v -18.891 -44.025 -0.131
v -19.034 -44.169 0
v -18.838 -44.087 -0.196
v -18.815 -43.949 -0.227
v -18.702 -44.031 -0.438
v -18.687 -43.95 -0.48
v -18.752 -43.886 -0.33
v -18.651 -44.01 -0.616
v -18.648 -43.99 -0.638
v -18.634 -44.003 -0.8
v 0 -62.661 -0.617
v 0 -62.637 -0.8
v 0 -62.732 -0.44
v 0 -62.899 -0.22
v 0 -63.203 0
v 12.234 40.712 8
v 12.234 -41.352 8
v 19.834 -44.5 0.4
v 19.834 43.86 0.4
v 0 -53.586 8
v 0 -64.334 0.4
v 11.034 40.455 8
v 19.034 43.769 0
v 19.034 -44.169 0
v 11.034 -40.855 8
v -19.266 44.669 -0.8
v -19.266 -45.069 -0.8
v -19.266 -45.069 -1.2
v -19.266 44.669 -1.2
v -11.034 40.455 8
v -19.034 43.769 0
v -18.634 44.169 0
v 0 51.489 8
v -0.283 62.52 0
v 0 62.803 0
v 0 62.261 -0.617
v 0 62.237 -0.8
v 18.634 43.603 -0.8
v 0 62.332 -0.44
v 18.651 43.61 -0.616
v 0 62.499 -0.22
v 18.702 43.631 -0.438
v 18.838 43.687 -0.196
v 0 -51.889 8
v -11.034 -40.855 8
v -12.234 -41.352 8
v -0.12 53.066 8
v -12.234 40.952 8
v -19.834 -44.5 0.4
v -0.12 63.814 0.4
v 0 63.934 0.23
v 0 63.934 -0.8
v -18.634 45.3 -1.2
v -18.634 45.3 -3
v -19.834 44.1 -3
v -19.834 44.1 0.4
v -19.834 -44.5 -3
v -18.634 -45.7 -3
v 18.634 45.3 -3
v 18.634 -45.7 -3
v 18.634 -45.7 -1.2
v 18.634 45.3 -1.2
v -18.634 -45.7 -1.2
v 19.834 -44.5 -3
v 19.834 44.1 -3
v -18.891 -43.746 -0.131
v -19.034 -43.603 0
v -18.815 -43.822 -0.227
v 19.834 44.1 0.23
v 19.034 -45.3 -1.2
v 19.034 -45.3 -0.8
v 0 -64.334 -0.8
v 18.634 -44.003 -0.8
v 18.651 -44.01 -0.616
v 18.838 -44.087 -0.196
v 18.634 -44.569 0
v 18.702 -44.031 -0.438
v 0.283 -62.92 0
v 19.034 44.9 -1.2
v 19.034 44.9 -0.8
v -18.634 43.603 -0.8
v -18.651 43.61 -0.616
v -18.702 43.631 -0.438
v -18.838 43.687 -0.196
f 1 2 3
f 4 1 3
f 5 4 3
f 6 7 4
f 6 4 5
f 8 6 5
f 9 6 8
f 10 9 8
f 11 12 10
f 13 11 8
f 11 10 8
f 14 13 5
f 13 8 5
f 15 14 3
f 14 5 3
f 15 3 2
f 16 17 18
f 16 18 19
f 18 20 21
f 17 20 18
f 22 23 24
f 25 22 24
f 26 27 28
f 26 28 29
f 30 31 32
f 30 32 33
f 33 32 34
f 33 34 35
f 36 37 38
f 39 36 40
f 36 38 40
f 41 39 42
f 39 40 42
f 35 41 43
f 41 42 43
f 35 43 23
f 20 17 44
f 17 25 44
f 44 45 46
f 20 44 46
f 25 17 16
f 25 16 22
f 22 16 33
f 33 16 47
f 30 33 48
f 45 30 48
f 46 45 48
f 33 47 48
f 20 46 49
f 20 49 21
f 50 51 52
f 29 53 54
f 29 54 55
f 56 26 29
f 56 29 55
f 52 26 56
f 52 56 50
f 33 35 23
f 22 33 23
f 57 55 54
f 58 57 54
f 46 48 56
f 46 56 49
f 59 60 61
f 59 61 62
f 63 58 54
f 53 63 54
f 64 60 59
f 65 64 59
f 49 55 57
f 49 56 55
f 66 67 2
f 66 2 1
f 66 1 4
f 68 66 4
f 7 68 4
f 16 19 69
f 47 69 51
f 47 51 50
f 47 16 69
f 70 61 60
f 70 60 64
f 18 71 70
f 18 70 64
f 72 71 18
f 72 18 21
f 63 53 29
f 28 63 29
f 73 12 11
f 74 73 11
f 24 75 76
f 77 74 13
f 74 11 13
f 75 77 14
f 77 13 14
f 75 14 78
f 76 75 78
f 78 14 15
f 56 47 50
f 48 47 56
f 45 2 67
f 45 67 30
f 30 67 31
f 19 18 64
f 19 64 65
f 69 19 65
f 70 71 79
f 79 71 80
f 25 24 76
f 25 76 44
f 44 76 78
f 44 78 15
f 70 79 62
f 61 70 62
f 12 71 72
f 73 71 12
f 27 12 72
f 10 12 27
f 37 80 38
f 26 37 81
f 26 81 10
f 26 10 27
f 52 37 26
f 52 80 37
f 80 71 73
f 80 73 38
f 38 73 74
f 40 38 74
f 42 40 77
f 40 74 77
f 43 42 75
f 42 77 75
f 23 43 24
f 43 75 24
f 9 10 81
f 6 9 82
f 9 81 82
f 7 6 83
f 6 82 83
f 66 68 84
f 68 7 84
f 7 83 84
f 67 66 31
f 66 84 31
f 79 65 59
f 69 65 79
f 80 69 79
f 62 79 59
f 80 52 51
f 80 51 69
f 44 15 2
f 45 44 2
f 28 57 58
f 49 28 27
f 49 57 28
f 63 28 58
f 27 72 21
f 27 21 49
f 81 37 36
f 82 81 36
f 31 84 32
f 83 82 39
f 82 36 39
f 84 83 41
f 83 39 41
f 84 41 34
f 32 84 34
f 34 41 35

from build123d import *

# Parameters (mm, degrees)
EXTRUDE_2_DEPTH          = 8
CUT_EXTRUDE_1_DEPTH      = 8
CUT_EXTRUDE_1_DRAFT      = -45
SKETCH_3_OUTSIDE_W       = 84.568
SKETCH_3_OUTSIDE_H       = 173.168
CUT_EXTRUDE_5_DEPTH      = 8
CUT_EXTRUDE_5_DRAFT      = -45
EXTRUDE_1_DEPTH          = 3
FILLET_1_R               = 1
FILLET_2_R               = 1
CUT_EXTRUDE_6_DEPTH      = 37.9
CUT_EXTRUDE_6_DEPTH_BACK = 0.4
SKETCH_5_W               = 0.4
SKETCH_5_H               = 87.60588745
SKETCH_7_W               = 38.3
SKETCH_7_H               = 22.901916238
CUT_EXTRUDE_8_DEPTH      = 0.4
SKETCH_8_W               = 38.3
SKETCH_8_H               = 25.571304525
CUT_EXTRUDE_9_DEPTH      = 0.4
SKETCH_9_W               = 37.268690424
SKETCH_9_H               = 136.16118074
CUT_EXTRUDE_10_DEPTH     = 1.8


with BuildPart() as part:
    # Skizze1 → Бобышка-Вытянуть2 (new body)
    with BuildSketch(Plane.XY):
        Polygon((-19.834345212, 44.1), (0, 63.934345212), (19.834345212, 44.1), (19.834345212, -44.5), (0, -64.334345212), (-19.834345212, -44.5), align=None)
    extrude(amount=EXTRUDE_2_DEPTH)


with BuildPart() as cut_extrude_1_tool:
    # Эскиз1 → Вырез-Вытянуть1 (with draft: the straight prism first)
    with BuildSketch(Plane(origin=(0, 0, 0), x_dir=(-1, 0, 0), z_dir=(0, 0, -1))):
        Polygon((0, 62.802974362), (-19.034345212, 43.76862915), (-19.034345212, -44.16862915), (0, -63.202974362), (19.034345212, -44.16862915), (19.034345212, 43.76862915), align=None)
    extrude(amount=-CUT_EXTRUDE_1_DEPTH)
    # Вырез-Вытянуть1: the draft: its side faces are tilted about the plane it starts from
    cut_extrude_1_sides = [cut_extrude_1_tool.faces().sort_by_distance(p)[0] for p in [
        (9.517172606, 53.285801756, 4),
        (19.034345212, -0.2, 4),
        (9.517172606, -53.685801756, 4),
        (-9.517172606, -53.685801756, 4),
        (-19.034345212, -0.2, 4),
        (-9.517172606, 53.285801756, 4),
    ]]
    draft(cut_extrude_1_sides, Plane(origin=(0, 0, 0), x_dir=(-1, 0, 0), z_dir=(0, 0, -1)), CUT_EXTRUDE_1_DRAFT)


with BuildPart() as part_1:
    add(part.part)

    # Вырез-Вытянуть1: cut by cut_extrude_1_tool
    add(cut_extrude_1_tool.part, mode=Mode.SUBTRACT)


with BuildPart() as cut_extrude_5_tool:
    # Эскиз3 outside → Вырез-Вытянуть5 (with draft: the straight prism first)
    with BuildSketch(Plane.XY.offset(8)):
        with Locations((0, -0.2)):
            Rectangle(SKETCH_3_OUTSIDE_W, SKETCH_3_OUTSIDE_H)
        Polygon((-12.234345212, 40.951976926), (-12.234345212, -41.351976926), (0, -53.586322138), (12.234345212, -41.351976926), (12.234345212, 40.711808204), (-0.120084361, 53.066237777), align=None, mode=Mode.SUBTRACT)
    extrude(amount=-CUT_EXTRUDE_5_DEPTH)
    # Вырез-Вытянуть5: the draft: its side faces are tilted about the plane it starts from
    cut_extrude_5_sides = [cut_extrude_5_tool.faces().sort_by_distance(p)[0] for p in [
        (0, -86.784, 4),
        (42.284, -0.2, 4),
        (0, 86.384, 4),
        (-42.284, -0.2, 4),
        (-6.177214787, 47.009107352, 4),
        (6.057130426, 46.889022991, 4),
        (12.234345212, -0.320084361, 4),
        (6.117172606, -47.469149532, 4),
        (-6.117172606, -47.469149532, 4),
        (-12.234345212, -0.2, 4),
    ]]
    draft(cut_extrude_5_sides, Plane.XY.offset(8), CUT_EXTRUDE_5_DRAFT)


with BuildPart() as part_2:
    add(part_1.part)

    # Вырез-Вытянуть5: cut by cut_extrude_5_tool
    add(cut_extrude_5_tool.part, mode=Mode.SUBTRACT)

    # Эскиз4 → Вытянуть-Тонкостенный1 (add)
    with BuildSketch(Plane(origin=(0, 0, 0), x_dir=(-1, 0, 0), z_dir=(0, 0, -1))):
        Polygon((19.834345212, 44.1), (19.834345212, -44.5), (0, -64.334345212), (-19.834345212, -44.5), (-19.834345212, 44.1), (0, 63.934345212), align=None)
        Polygon((18.634345212, 43.602943725), (18.634345212, -44.002943725), (0, -62.637288937), (-18.634345212, -44.002943725), (-18.634345212, 43.602943725), (0, 62.237288937), align=None, mode=Mode.SUBTRACT)
    extrude(amount=EXTRUDE_1_DEPTH)

    # Скругление1
    # the kernel refuses this fillet: 1 mm, written as the material it takes off along each edge
    with BuildSketch(Plane(origin=(-18.634345212, 45.602943725, 0), x_dir=(-1, 0, 0), z_dir=(0, -1, 0))) as fillet_1_piece_1_section:
        with BuildLine():
            CenterArc((1, 0.8), FILLET_1_R, 180, 53.130102354)
            Line((0, 0.8), (-0.02, 0.8))
            Line((-0.02, 0.8), (-0.02, 0))
            Line((-0.02, 0), (0, -0.02))
            ThreePointArc((0, -0.02), (0.2, -0.02), (0.388, -0.016))
            Line((0.388, -0.016), (0.4, 0))
        make_face()
    fillet_1_piece_1 = extrude(amount=91.60588745, mode=Mode.PRIVATE)
    fillet_1_piece_1 = split(fillet_1_piece_1, bisect_by=Plane(origin=(-18.834345212, 45.602943725, 0.2), z_dir=(0.7071067811865462, 0, -0.7071067811865488)), keep=Keep.TOP, mode=Mode.PRIVATE)
    fillet_1_piece_1 = split(fillet_1_piece_1, bisect_by=Plane(origin=(-63.437288937, 0.8, 0), z_dir=(0.7071067811865476, 0.7071067811865476, 0)), keep=Keep.TOP, mode=Mode.PRIVATE)
    fillet_1_piece_1 = split(fillet_1_piece_1, bisect_by=Plane(origin=(-17.634345212, 44.602943725, 0), z_dir=(0.7071067811865469, -0.7071067811865481, 0)), keep=Keep.TOP, mode=Mode.PRIVATE)
    add(fillet_1_piece_1, mode=Mode.SUBTRACT)
    with BuildSketch(Plane(origin=(0, 62.237288937, 0), x_dir=(-0.7071067811865469, 0.7071067811865482, 0), z_dir=(-0.7071067811865481, -0.7071067811865469, 0))) as fillet_1_piece_2_section:
        with BuildLine():
            CenterArc((1, 0.8), FILLET_1_R, 180, 53.130102354)
            Line((0, 0.8), (-0.02, 0.8))
            Line((-0.02, 0.8), (-0.02, 0))
            Line((-0.02, 0), (0, -0.02))
            ThreePointArc((0, -0.02), (0.2, -0.02), (0.388, -0.016))
            Line((0.388, -0.016), (0.4, 0))
        make_face()
    fillet_1_piece_2 = extrude(amount=28.352943725, mode=Mode.PRIVATE)
    fillet_1_piece_2 = split(fillet_1_piece_2, bisect_by=Plane(origin=(-0.141421356, 62.378710294, 0.2), z_dir=(0.499999999999999, -0.4999999999999993, -0.7071067811865488)), keep=Keep.TOP, mode=Mode.PRIVATE)
    fillet_1_piece_2 = split(fillet_1_piece_2, bisect_by=Plane(origin=(-18.634345212, 62.237288937, 0), z_dir=(1, 0, 0)), keep=Keep.TOP, mode=Mode.PRIVATE)
    add(fillet_1_piece_2, mode=Mode.SUBTRACT)
    with BuildSketch(Plane(origin=(0, 62.237288937, 0), x_dir=(-0.7071067811865469, 0.7071067811865482, 0), z_dir=(-0.7071067811865481, -0.7071067811865469, 0))) as fillet_1_piece_3a_section:
        with BuildLine():
            CenterArc((1, 0.8), FILLET_1_R, 180, 53.130102354)
            Line((0, 0.8), (-0.02, 0.8))
            Line((-0.02, 0.8), (-0.02, 0))
            Line((-0.02, 0), (0, -0.02))
            ThreePointArc((0, -0.02), (0.2, -0.02), (0.388, -0.016))
            Line((0.388, -0.016), (0.4, 0))
        make_face()
    fillet_1_piece_3a = extrude(amount=28.352943725, mode=Mode.PRIVATE)
    fillet_1_piece_3a = split(fillet_1_piece_3a, bisect_by=Plane(origin=(-9.517172606, 62.237288937, 9.517172606), z_dir=(0.7071067811865462, 0, -0.7071067811865488)), keep=Keep.TOP, mode=Mode.PRIVATE)
    fillet_1_piece_3a = split(fillet_1_piece_3a, bisect_by=Plane(origin=(-0.141421356, 62.378710294, 0.2), z_dir=(0.499999999999999, -0.4999999999999993, -0.7071067811865488)), keep=Keep.TOP, mode=Mode.PRIVATE)
    fillet_1_piece_3a = split(fillet_1_piece_3a, bisect_by=Plane(origin=(-18.634345212, 62.237288937, 0), z_dir=(-1, 0, 0)), keep=Keep.TOP, mode=Mode.PRIVATE)
    with BuildSketch(Plane(origin=(-18.634345212, 45.602943725, 0), x_dir=(-1, 0, 0), z_dir=(0, -1, 0))) as fillet_1_piece_3b_section:
        with BuildLine():
            CenterArc((1, 0.8), FILLET_1_R, 180, 53.130102354)
            Line((0, 0.8), (-0.02, 0.8))
            Line((-0.02, 0.8), (-0.02, 0))
            Line((-0.02, 0), (0, -0.02))
            ThreePointArc((0, -0.02), (0.2, -0.02), (0.388, -0.016))
            Line((0.388, -0.016), (0.4, 0))
        make_face()
    fillet_1_piece_3b = extrude(amount=91.60588745, mode=Mode.PRIVATE)
    fillet_1_piece_3b = split(fillet_1_piece_3b, bisect_by=Plane(origin=(-18.834345212, 45.602943725, 0.2), z_dir=(0.7071067811865462, 0, -0.7071067811865488)), keep=Keep.TOP, mode=Mode.PRIVATE)
    fillet_1_piece_3b = split(fillet_1_piece_3b, bisect_by=Plane(origin=(-18.275766569, 45.244365081, -0.507106781), z_dir=(0.499999999999999, -0.4999999999999993, -0.7071067811865488)), keep=Keep.TOP, mode=Mode.PRIVATE)
    fillet_1_piece_3b = split(fillet_1_piece_3b, bisect_by=Plane(origin=(-17.634345212, 44.602943725, 0), z_dir=(-0.7071067811865469, 0.7071067811865481, 0)), keep=Keep.TOP, mode=Mode.PRIVATE)
    fillet_1_piece_3 = fillet_1_piece_3a & fillet_1_piece_3b
    add(fillet_1_piece_3, mode=Mode.SUBTRACT)

    # Скругление2
    # the kernel refuses this fillet: 1 mm, written as the material it takes off along each edge
    with BuildSketch(Plane(origin=(-20.802112165, -41.835176772, 0), x_dir=(-0.7071067811865467, -0.7071067811865485, -2.6367796834847523e-15), z_dir=(0.7071067811865485, -0.7071067811865466, 0))) as fillet_2_piece_1_section:
        with BuildLine():
            CenterArc((FILLET_2_R, FILLET_2_R), FILLET_2_R, 180, 90)
            Line((0, FILLET_2_R), (0, 0))
            Line((0, 0), (FILLET_2_R, 0))
        make_face()
    fillet_2_piece_1 = extrude(amount=2.899999894, mode=Mode.PRIVATE)
    fillet_2_piece_1 = fillet_2_piece_1 - Plane(origin=(-19.634345212, -41.835176772, -0.8), x_dir=(-1, 0, 0), z_dir=(0, 1, 0)) * Cylinder(1, 10, mode=Mode.PRIVATE)
    add(fillet_2_piece_1, mode=Mode.SUBTRACT)
    with BuildSketch(Plane(origin=(-18.751502574, -43.885786363, 0), x_dir=(-0.7071067811865466, -0.7071067811865485, -1.909421767788959e-14), z_dir=(0.7071067811865485, -0.7071067811865466, 0))) as fillet_2_piece_2_section:
        with BuildLine():
            CenterArc((1, 0.8), FILLET_2_R, 180, 53.130102354)
            Line((0, 0.8), (0, 0))
            Line((0, 0), (0.4, 0))
        make_face()
    fillet_2_piece_2 = extrude(amount=26.518629256, mode=Mode.PRIVATE)
    fillet_2_piece_2 = fillet_2_piece_2 - Plane(origin=(-19.634345212, -43.885786363, -0.8), x_dir=(-1, 0, 0), z_dir=(0, 1, 0)) * Cylinder(1, 57, mode=Mode.PRIVATE)
    add(fillet_2_piece_2, mode=Mode.SUBTRACT)
    with BuildSketch(Plane(origin=(0, -62.637288937, 0), x_dir=(0.7071067811865472, -0.7071067811865478, 0), z_dir=(0.7071067811865479, 0.7071067811865474, 0))) as fillet_2_piece_3_section:
        with BuildLine():
            CenterArc((1, 0.8), FILLET_2_R, 180, 53.130102354)
            Line((0, 0.8), (0, 0))
            Line((0, 0), (0.4, 0))
        make_face()
    fillet_2_piece_3 = extrude(amount=28.352943725, mode=Mode.PRIVATE)
    fillet_2_piece_3 = split(fillet_2_piece_3, bisect_by=Plane(origin=(18.634345212, -62.637288937, 0), z_dir=(-1, 0, 0)), keep=Keep.TOP, mode=Mode.PRIVATE)
    add(fillet_2_piece_3, mode=Mode.SUBTRACT)
    with BuildSketch(Plane(origin=(18.634345212, -46.002943725, 0), x_dir=(1, 0, 0), z_dir=(0, 1, 0))) as fillet_2_piece_4_section:
        with BuildLine():
            CenterArc((1, 0.8), FILLET_2_R, 180, 53.130102354)
            Line((0, 0.8), (0, 0))
            Line((0, 0), (0.4, 0))
        make_face()
    fillet_2_piece_4 = extrude(amount=91.60588745, mode=Mode.PRIVATE)
    fillet_2_piece_4 = split(fillet_2_piece_4, bisect_by=Plane(origin=(17.634345212, -45.002943725, 0), z_dir=(-0.7071067811865472, 0.7071067811865478, 0)), keep=Keep.TOP, mode=Mode.PRIVATE)
    fillet_2_piece_4 = split(fillet_2_piece_4, bisect_by=Plane(origin=(63.437288937, -1.2, 0), z_dir=(-0.7071067811865478, -0.7071067811865472, 0)), keep=Keep.TOP, mode=Mode.PRIVATE)
    add(fillet_2_piece_4, mode=Mode.SUBTRACT)
    with BuildSketch(Plane(origin=(20.048558775, 42.188730163, 0), x_dir=(0.7071067811865491, 0.707106781186546, 5.342948306008711e-15), z_dir=(-0.707106781186546, 0.7071067811865491, 0))) as fillet_2_piece_5_section:
        with BuildLine():
            CenterArc((1, 0.8), FILLET_2_R, 180, 53.130102354)
            Line((0, 0.8), (0, 0))
            Line((0, 0), (0.4, 0))
        make_face()
    fillet_2_piece_5 = extrude(amount=30.752943725, mode=Mode.PRIVATE)
    fillet_2_piece_5 = fillet_2_piece_5 - Plane(origin=(-0.707106781, 62.944395719, -0.8), x_dir=(-0.7071067811865476, 0.7071067811865476, 0), z_dir=(0.7071067811865476, 0.7071067811865476, 0)) * Cylinder(1, 65, mode=Mode.PRIVATE)
    fillet_2_piece_5 = split(fillet_2_piece_5, bisect_by=Plane(origin=(18.634345212, 42.188730163, 0), z_dir=(-1, 0, 0)), keep=Keep.TOP, mode=Mode.PRIVATE)
    add(fillet_2_piece_5, mode=Mode.SUBTRACT)
    with BuildSketch(Plane(origin=(-1.414213562, -64.0515025, 0), x_dir=(0.7071067811865472, -0.7071067811865478, 0), z_dir=(0.7071067811865479, 0.7071067811865474, 0))) as fillet_2_piece_6a_section:
        with BuildLine():
            CenterArc((1, 0.8), FILLET_2_R, 180, 53.130102354)
            Line((0, 0.8), (0, 0))
            Line((0, 0), (0.4, 0))
        make_face()
    fillet_2_piece_6a = extrude(amount=30.352943725, mode=Mode.PRIVATE)
    fillet_2_piece_6a = split(fillet_2_piece_6a, bisect_by=Plane(origin=(-0.848528137, -63.485817075, -0.8), z_dir=(0.4999999999999991, 0.4999999999999993, -0.7071067811865489)), keep=Keep.TOP, mode=Mode.PRIVATE)
    fillet_2_piece_6a = split(fillet_2_piece_6a, bisect_by=Plane(origin=(0, -62.637288937, 0), z_dir=(-0.7071067811865476, -0.7071067811865476, 0)), keep=Keep.TOP, mode=Mode.PRIVATE)
    with BuildSketch(Plane(origin=(-18.751502574, -43.885786363, 0), x_dir=(-0.7071067811865466, -0.7071067811865485, -1.909421767788959e-14), z_dir=(0.7071067811865485, -0.7071067811865466, 0))) as fillet_2_piece_6b_section:
        with BuildLine():
            CenterArc((1, 0.8), FILLET_2_R, 180, 53.130102354)
            Line((0, 0.8), (0, 0))
            Line((0, 0), (0.4, 0))
        make_face()
    fillet_2_piece_6b = extrude(amount=28.518629256, mode=Mode.PRIVATE)
    fillet_2_piece_6b = split(fillet_2_piece_6b, bisect_by=Plane(origin=(0, -62.637288937, 0), z_dir=(0.7071067811865472, -0.7071067811865478, 0)), keep=Keep.TOP, mode=Mode.PRIVATE)
    fillet_2_piece_6b = split(fillet_2_piece_6b, bisect_by=Plane(origin=(-9.234329931, -53.402959006, 13.459314628), z_dir=(-0.4999999999999991, 0.4999999999999991, -0.7071067811865488)), keep=Keep.TOP, mode=Mode.PRIVATE)
    fillet_2_piece_6 = fillet_2_piece_6a & fillet_2_piece_6b
    add(fillet_2_piece_6, mode=Mode.SUBTRACT)
    with BuildSketch(Plane(origin=(18.634345212, -46.002943725, 0), x_dir=(1, 0, 0), z_dir=(0, 1, 0))) as fillet_2_piece_7a_section:
        with BuildLine():
            CenterArc((1, 0.8), FILLET_2_R, 180, 53.130102354)
            Line((0, 0.8), (0, 0))
            Line((0, 0), (0.4, 0))
        make_face()
    fillet_2_piece_7a = extrude(amount=91.60588745, mode=Mode.PRIVATE)
    fillet_2_piece_7a = split(fillet_2_piece_7a, bisect_by=Plane(origin=(17.634345212, -45.002943725, 0), z_dir=(0.7071067811865472, -0.7071067811865478, 0)), keep=Keep.TOP, mode=Mode.PRIVATE)
    fillet_2_piece_7a = split(fillet_2_piece_7a, bisect_by=Plane(origin=(18.275766569, -45.644365081, -0.507106781), z_dir=(-0.4999999999999991, 0.4999999999999991, -0.7071067811865488)), keep=Keep.TOP, mode=Mode.PRIVATE)
    with BuildSketch(Plane(origin=(0, -62.637288937, 0), x_dir=(0.7071067811865472, -0.7071067811865478, 0), z_dir=(0.7071067811865479, 0.7071067811865474, 0))) as fillet_2_piece_7b_section:
        with BuildLine():
            CenterArc((1, 0.8), FILLET_2_R, 180, 53.130102354)
            Line((0, 0.8), (0, 0))
            Line((0, 0), (0.4, 0))
        make_face()
    fillet_2_piece_7b = extrude(amount=28.352943725, mode=Mode.PRIVATE)
    fillet_2_piece_7b = split(fillet_2_piece_7b, bisect_by=Plane(origin=(18.634345212, -62.637288937, 0), z_dir=(1, 0, 0)), keep=Keep.TOP, mode=Mode.PRIVATE)
    fillet_2_piece_7b = split(fillet_2_piece_7b, bisect_by=Plane(origin=(9.517172606, -62.637288937, 9.517172606), z_dir=(-0.7071067811865462, 0, -0.7071067811865488)), keep=Keep.TOP, mode=Mode.PRIVATE)
    fillet_2_piece_7 = fillet_2_piece_7a & fillet_2_piece_7b
    add(fillet_2_piece_7, mode=Mode.SUBTRACT)
    with BuildSketch(Plane(origin=(20.048558775, 42.188730163, 0), x_dir=(0.7071067811865491, 0.707106781186546, 5.342948306008711e-15), z_dir=(-0.707106781186546, 0.7071067811865491, 0))) as fillet_2_piece_8a_section:
        with BuildLine():
            CenterArc((1, 0.8), FILLET_2_R, 180, 53.130102354)
            Line((0, 0.8), (0, 0))
            Line((0, 0), (0.4, 0))
        make_face()
    fillet_2_piece_8a = extrude(amount=30.752943725, mode=Mode.PRIVATE)
    fillet_2_piece_8a = split(fillet_2_piece_8a, bisect_by=Plane(origin=(18.634345212, 42.188730163, 0), z_dir=(1, 0, 0)), keep=Keep.TOP, mode=Mode.PRIVATE)
    fillet_2_piece_8a = split(fillet_2_piece_8a, bisect_by=Plane(origin=(19.541451993, 42.188730163, -0.507106781), z_dir=(-0.7071067811865462, 0, -0.7071067811865488)), keep=Keep.TOP, mode=Mode.PRIVATE)
    with BuildSketch(Plane(origin=(18.634345212, -46.002943725, 0), x_dir=(1, 0, 0), z_dir=(0, 1, 0))) as fillet_2_piece_8b_section:
        with BuildLine():
            CenterArc((1, 0.8), FILLET_2_R, 180, 53.130102354)
            Line((0, 0.8), (0, 0))
            Line((0, 0), (0.4, 0))
        make_face()
    fillet_2_piece_8b = extrude(amount=91.60588745, mode=Mode.PRIVATE)
    fillet_2_piece_8b = split(fillet_2_piece_8b, bisect_by=Plane(origin=(63.437288937, -1.2, 0), z_dir=(0.7071067811865478, 0.7071067811865472, 0)), keep=Keep.TOP, mode=Mode.PRIVATE)
    fillet_2_piece_8b = split(fillet_2_piece_8b, bisect_by=Plane(origin=(41.177238431, -23.460050506, 31.880465325), z_dir=(-0.4999999999999991, -0.4999999999999991, -0.7071067811865488)), keep=Keep.TOP, mode=Mode.PRIVATE)
    fillet_2_piece_8 = fillet_2_piece_8a & fillet_2_piece_8b
    add(fillet_2_piece_8, mode=Mode.SUBTRACT)

    # Эскиз5 → Вырез-Вытянуть6 (cut, two sides: drawn at the far end of the back side and taken through both)
    with BuildSketch(Plane.ZY.offset(-18.634345212).offset(-CUT_EXTRUDE_6_DEPTH_BACK)):
        with Locations((-1, -0.2)):
            Rectangle(SKETCH_5_W, SKETCH_5_H)
    extrude(amount=CUT_EXTRUDE_6_DEPTH + CUT_EXTRUDE_6_DEPTH_BACK, mode=Mode.SUBTRACT)

    # Эскиз7 → Вырез-Вытянуть8 (cut)
    with BuildSketch(Plane(origin=(0, 0, -0.8), x_dir=(-1, 0, 0), z_dir=(0, 0, -1))):
        with Locations((0.115654788, 55.053901844)):
            Rectangle(SKETCH_7_W, SKETCH_7_H)
    extrude(amount=CUT_EXTRUDE_8_DEPTH, mode=Mode.SUBTRACT)

    # Эскиз8 → Вырез-Вытянуть9 (cut)
    with BuildSketch(Plane(origin=(0, 0, -0.8), x_dir=(-1, 0, 0), z_dir=(0, 0, -1))):
        with Locations((0.115654788, -56.788595988)):
            Rectangle(SKETCH_8_W, SKETCH_8_H)
    extrude(amount=CUT_EXTRUDE_9_DEPTH, mode=Mode.SUBTRACT)

    # Эскиз9 → Вырез-Вытянуть10 (cut)
    with BuildSketch(Plane(origin=(0, 0, -3), x_dir=(-1, 0, 0), z_dir=(0, 0, -1))):
        with Locations((0, 0.604946385)):
            Rectangle(SKETCH_9_W, SKETCH_9_H)
    extrude(amount=-CUT_EXTRUDE_10_DEPTH, mode=Mode.SUBTRACT)


solid = part_2.part
